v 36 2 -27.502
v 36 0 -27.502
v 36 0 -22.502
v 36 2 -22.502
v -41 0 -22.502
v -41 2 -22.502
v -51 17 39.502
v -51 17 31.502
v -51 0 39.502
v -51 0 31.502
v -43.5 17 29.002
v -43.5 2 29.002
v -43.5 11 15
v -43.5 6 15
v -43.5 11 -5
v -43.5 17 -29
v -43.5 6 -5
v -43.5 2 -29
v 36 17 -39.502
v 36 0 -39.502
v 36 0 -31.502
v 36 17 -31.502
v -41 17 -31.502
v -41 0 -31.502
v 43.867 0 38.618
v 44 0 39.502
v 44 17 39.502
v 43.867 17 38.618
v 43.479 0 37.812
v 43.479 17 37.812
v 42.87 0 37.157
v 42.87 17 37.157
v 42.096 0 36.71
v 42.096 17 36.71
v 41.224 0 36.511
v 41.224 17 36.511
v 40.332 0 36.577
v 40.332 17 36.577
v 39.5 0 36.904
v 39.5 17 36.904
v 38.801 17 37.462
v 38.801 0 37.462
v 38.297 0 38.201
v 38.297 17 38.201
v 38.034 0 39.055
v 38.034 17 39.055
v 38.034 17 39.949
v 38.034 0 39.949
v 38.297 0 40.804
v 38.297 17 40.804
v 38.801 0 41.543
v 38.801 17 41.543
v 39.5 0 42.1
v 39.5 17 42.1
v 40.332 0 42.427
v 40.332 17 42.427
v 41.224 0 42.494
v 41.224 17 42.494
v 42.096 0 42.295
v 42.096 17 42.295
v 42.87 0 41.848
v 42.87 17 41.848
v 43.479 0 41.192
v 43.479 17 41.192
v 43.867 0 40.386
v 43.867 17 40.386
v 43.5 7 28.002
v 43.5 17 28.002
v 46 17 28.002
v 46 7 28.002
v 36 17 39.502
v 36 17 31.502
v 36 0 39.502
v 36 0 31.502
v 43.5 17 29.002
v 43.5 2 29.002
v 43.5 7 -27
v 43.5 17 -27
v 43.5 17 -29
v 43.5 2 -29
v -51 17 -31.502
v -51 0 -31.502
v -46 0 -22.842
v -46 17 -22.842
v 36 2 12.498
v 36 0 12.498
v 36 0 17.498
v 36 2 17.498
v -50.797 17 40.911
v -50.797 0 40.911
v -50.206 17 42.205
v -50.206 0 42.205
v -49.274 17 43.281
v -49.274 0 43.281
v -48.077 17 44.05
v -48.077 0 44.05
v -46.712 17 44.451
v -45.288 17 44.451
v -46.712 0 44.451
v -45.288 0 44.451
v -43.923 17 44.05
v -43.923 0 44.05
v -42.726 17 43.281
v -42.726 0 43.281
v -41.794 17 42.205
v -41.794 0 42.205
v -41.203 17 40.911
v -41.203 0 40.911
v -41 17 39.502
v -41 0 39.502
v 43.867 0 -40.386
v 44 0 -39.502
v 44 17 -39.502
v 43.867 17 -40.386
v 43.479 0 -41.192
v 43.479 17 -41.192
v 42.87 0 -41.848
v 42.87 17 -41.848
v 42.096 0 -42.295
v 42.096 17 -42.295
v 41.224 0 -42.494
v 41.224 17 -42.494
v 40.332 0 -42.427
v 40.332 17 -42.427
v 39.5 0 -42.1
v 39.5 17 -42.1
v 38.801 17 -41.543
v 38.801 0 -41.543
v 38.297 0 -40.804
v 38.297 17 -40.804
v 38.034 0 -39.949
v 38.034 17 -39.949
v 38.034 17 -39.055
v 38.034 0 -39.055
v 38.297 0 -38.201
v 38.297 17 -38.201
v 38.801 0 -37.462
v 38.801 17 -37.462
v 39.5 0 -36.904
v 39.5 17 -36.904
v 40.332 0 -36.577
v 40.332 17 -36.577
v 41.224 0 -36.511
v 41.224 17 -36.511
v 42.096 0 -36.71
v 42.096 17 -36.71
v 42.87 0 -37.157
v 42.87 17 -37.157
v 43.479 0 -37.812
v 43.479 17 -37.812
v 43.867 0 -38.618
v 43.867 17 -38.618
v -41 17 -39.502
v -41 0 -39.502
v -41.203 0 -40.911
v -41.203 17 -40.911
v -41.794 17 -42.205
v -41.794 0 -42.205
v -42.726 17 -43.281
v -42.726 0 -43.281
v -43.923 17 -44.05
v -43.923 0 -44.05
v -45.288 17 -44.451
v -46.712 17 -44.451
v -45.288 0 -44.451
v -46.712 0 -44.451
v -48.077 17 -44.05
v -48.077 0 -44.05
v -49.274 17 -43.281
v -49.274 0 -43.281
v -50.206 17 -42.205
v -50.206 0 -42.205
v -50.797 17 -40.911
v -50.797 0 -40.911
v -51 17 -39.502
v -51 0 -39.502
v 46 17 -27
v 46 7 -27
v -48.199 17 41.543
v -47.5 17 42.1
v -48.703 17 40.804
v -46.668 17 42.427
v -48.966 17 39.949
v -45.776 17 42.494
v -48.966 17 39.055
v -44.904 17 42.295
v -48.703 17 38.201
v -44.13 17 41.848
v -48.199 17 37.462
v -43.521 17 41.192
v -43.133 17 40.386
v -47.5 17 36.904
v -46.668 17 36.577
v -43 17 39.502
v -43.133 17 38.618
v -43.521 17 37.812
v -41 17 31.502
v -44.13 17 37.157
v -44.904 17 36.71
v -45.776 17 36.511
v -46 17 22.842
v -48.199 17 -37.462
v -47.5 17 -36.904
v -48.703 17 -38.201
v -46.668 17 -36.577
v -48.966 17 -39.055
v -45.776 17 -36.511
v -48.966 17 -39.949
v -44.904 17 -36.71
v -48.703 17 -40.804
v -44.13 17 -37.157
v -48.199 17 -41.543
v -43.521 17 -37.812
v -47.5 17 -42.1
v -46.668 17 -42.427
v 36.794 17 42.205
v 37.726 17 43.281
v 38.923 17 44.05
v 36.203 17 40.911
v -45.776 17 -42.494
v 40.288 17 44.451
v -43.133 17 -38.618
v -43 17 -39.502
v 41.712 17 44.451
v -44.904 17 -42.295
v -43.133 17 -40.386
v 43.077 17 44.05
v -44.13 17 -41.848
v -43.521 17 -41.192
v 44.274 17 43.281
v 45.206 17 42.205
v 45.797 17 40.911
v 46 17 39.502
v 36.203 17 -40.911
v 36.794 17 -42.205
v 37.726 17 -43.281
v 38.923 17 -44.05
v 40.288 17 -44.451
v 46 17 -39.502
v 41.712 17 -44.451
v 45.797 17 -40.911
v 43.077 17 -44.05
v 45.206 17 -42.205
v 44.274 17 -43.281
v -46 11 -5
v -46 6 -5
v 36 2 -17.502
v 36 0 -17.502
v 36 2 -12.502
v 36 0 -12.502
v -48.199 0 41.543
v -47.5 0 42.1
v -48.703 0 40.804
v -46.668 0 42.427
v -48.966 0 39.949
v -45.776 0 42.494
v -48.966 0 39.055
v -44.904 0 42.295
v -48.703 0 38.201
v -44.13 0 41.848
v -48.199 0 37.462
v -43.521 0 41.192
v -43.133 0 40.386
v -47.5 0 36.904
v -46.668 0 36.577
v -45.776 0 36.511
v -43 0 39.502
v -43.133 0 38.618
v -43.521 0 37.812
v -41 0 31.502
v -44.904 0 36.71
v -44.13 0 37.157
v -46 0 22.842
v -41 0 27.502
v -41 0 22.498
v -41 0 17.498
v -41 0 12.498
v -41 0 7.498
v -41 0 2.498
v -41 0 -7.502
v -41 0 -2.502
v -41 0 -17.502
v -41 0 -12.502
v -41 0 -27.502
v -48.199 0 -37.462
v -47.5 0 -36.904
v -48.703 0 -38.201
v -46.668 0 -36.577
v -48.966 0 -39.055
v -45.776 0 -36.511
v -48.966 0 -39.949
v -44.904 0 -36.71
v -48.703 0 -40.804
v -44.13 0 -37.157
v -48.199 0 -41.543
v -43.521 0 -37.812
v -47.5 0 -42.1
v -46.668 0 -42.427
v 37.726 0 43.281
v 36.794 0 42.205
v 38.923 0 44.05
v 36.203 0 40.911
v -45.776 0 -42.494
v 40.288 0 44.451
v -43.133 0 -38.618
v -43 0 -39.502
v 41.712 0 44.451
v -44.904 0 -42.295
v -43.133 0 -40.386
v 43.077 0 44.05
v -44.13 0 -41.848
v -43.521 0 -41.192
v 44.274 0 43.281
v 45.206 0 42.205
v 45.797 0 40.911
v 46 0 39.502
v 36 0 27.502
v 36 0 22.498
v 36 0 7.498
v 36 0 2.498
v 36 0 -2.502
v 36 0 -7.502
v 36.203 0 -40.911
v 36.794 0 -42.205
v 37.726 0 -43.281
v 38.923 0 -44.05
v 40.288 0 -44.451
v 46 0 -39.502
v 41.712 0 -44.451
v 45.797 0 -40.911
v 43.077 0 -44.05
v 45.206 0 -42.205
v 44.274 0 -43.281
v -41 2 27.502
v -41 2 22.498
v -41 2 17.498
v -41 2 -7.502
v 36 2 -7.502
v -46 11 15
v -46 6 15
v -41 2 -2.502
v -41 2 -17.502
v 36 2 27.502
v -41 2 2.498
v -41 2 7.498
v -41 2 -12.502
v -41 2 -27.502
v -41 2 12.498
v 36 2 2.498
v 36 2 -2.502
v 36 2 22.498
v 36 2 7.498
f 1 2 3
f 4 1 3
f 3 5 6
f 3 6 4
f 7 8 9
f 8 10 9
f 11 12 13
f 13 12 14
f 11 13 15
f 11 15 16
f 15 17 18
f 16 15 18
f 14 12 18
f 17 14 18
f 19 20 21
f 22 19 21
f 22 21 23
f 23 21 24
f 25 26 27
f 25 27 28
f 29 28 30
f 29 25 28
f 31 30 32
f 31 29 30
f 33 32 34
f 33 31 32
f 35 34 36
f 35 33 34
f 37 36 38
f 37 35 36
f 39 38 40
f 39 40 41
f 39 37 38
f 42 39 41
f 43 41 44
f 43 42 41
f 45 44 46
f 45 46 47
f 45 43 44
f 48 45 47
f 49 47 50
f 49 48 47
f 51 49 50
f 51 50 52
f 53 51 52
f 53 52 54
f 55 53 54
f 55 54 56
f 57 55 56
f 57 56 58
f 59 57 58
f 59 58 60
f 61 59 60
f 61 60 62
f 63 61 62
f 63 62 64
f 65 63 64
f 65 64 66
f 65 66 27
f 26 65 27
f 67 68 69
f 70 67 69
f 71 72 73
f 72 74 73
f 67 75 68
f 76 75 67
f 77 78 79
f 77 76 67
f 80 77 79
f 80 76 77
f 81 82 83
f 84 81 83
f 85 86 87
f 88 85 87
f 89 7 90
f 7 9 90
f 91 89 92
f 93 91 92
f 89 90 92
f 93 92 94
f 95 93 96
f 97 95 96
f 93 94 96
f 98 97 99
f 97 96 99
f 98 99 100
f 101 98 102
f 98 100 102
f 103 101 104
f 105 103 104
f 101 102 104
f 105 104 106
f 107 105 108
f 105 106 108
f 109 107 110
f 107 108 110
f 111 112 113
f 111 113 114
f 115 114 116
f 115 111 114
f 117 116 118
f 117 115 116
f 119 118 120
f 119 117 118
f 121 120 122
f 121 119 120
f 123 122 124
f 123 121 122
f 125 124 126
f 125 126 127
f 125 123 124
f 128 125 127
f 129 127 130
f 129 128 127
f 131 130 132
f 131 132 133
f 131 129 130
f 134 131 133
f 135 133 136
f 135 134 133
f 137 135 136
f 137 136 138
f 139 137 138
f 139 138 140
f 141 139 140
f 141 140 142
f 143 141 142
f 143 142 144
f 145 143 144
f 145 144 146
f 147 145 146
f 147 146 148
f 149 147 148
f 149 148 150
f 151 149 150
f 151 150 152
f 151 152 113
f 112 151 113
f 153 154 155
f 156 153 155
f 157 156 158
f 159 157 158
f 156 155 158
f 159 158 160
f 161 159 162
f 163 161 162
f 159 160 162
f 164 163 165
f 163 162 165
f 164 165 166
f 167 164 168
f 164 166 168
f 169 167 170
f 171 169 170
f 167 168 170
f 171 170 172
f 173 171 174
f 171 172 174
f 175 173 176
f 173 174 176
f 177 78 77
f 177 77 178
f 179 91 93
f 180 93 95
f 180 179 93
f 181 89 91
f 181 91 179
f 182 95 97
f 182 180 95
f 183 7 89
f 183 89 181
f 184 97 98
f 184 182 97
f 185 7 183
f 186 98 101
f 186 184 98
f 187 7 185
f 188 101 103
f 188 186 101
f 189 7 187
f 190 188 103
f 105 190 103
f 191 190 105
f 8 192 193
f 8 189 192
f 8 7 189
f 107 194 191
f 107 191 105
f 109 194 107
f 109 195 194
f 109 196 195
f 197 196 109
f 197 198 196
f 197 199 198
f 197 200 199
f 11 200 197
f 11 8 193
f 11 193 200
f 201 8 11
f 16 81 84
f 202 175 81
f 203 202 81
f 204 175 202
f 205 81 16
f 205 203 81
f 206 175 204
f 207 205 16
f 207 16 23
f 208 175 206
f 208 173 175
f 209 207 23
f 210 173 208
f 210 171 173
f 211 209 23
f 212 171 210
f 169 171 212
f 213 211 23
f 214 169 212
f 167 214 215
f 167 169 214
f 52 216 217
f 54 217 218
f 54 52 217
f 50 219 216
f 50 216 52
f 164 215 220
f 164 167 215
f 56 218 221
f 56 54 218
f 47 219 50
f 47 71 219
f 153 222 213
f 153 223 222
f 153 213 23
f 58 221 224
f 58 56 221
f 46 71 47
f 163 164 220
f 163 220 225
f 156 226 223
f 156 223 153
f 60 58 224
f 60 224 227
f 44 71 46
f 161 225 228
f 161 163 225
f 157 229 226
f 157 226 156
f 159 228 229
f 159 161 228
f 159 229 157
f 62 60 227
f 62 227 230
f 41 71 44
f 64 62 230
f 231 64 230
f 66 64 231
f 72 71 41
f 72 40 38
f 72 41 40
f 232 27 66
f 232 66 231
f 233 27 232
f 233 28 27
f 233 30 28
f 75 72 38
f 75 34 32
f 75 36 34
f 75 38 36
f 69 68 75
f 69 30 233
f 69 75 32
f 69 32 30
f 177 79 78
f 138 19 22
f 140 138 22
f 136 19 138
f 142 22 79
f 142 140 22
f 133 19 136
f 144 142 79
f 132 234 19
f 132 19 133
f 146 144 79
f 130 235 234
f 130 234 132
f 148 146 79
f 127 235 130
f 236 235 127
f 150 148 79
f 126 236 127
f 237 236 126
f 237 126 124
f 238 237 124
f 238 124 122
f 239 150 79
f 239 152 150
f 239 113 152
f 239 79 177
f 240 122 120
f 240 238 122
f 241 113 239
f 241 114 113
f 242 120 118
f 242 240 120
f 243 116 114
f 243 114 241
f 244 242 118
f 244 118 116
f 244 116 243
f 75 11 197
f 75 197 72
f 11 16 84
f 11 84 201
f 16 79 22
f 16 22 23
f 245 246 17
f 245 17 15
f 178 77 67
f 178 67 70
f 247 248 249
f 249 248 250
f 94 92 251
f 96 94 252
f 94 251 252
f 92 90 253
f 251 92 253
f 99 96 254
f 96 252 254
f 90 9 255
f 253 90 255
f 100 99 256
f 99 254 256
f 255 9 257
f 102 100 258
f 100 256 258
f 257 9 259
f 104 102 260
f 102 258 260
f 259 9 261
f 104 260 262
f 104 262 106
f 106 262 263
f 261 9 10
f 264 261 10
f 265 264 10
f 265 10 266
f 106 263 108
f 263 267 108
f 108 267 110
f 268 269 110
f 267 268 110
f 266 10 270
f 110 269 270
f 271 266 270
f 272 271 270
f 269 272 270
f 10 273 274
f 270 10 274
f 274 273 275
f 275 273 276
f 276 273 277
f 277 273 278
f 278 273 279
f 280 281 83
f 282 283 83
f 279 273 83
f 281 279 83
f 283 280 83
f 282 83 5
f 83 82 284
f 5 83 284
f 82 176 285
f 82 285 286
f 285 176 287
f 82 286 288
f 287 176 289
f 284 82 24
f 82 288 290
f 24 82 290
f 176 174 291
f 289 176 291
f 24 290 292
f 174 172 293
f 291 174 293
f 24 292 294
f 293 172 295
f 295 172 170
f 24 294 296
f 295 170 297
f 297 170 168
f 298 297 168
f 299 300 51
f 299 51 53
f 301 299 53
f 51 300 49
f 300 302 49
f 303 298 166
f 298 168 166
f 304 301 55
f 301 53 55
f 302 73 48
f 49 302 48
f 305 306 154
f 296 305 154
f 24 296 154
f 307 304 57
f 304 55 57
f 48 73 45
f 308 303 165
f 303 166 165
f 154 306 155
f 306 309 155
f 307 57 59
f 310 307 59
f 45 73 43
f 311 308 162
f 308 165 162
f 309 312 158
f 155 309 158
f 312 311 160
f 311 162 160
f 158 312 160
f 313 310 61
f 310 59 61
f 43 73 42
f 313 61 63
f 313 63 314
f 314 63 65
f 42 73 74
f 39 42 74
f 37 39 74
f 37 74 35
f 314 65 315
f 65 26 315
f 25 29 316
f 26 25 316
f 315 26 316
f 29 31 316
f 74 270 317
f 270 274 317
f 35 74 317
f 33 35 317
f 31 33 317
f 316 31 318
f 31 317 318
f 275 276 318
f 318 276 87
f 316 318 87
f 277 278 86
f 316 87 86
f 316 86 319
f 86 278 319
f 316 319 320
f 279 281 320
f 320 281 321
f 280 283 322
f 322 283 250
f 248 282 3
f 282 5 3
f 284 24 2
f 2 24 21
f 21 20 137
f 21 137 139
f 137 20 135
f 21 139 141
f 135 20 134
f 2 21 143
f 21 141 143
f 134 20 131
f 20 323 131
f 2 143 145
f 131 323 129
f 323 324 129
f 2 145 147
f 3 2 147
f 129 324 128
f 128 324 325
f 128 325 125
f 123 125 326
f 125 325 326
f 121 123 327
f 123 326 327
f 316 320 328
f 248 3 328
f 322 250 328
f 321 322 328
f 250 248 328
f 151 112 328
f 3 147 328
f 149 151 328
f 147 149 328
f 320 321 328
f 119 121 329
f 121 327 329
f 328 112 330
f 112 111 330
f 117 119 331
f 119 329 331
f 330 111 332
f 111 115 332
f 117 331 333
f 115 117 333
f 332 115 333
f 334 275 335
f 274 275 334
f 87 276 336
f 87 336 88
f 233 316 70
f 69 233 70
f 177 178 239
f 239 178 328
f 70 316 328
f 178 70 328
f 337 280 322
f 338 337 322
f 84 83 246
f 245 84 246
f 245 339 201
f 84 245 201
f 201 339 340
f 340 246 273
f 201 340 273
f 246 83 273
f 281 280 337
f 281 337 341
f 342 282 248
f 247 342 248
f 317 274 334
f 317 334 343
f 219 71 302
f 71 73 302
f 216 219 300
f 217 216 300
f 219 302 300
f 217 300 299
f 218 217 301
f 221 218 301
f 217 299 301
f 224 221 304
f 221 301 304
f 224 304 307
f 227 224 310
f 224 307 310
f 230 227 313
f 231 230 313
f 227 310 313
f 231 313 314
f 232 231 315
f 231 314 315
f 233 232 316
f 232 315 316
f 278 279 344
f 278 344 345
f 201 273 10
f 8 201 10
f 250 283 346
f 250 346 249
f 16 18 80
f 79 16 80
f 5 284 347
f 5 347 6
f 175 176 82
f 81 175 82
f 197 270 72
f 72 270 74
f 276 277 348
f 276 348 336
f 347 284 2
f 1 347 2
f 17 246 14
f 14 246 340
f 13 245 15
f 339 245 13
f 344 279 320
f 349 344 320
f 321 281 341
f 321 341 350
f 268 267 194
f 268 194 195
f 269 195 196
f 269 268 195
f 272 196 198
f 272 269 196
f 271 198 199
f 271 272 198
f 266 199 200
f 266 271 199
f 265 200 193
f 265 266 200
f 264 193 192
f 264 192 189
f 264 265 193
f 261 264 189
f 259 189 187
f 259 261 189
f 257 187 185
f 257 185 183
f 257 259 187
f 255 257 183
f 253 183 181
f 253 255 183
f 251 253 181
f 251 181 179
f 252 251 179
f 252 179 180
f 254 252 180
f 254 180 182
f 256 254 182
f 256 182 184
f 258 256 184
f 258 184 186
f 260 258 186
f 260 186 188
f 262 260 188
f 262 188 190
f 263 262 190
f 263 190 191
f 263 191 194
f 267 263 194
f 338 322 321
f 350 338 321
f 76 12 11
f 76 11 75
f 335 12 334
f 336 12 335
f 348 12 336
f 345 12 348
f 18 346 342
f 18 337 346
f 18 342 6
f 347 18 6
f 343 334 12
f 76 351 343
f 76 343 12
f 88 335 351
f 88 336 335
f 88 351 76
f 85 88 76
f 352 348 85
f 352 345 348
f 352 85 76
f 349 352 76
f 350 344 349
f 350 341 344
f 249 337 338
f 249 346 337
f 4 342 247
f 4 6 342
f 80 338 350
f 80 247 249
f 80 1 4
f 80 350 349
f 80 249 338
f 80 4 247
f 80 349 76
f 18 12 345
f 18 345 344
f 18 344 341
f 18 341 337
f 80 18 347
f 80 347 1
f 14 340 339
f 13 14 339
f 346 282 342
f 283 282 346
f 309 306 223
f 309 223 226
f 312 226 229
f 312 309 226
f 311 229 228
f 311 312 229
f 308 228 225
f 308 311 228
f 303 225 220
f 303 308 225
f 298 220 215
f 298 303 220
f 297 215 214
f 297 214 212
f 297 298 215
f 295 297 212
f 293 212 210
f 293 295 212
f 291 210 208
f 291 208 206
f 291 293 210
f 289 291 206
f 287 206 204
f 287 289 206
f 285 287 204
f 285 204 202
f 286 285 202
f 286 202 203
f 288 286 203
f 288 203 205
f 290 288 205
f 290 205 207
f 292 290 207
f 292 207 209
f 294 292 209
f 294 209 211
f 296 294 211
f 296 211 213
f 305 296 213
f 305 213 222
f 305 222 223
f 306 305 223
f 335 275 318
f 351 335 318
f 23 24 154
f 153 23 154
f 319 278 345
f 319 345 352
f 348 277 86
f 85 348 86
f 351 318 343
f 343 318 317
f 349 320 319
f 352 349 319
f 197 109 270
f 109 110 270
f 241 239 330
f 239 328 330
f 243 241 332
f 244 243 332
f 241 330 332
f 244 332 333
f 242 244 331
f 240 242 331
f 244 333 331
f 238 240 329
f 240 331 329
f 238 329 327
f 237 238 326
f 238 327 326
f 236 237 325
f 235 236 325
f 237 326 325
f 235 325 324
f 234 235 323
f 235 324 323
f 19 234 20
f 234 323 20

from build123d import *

# Parameters (mm, degrees)
BOSS_EXTRUDE1_DEPTH = 2
SKETCH6_W           = 87
SKETCH6_H           = 58.002207555
BOSS_EXTRUDE3_DEPTH = 15
SKETCH10_W          = 2.5
SKETCH10_H          = 55.002207555
CUT_EXTRUDE2_DEPTH  = 10
HOLE5_START         = -1
HOLE5_OUTLINE_R     = 3
HOLE5_DEPTH         = 18
SKETCH15_W          = 20
SKETCH15_H          = 5
CUT_EXTRUDE4_DEPTH  = 2.5
SKETCH_2_W          = 77
SKETCH_2_H          = 5
SKETCH_2_H_2        = 5.00441511
CUT_EXTRUDE_4_DEPTH = 10


with BuildPart() as part:
    # Sketch1 → Boss-Extrude1 (new body)
    with BuildSketch(Plane(origin=(0, 0, 0), x_dir=(1, 0, 0), z_dir=(0, 1, 0))):
        with BuildLine():
            Line((-46, 22.841953517), (-46, -22.841953517))
            Line((-46, -22.841953517), (-51, -31.502207555))
            Line((-51, -31.502207555), (-51, -39.502207555))
            ThreePointArc((-51, -39.502207555), (-46, -44.502207555), (-41, -39.502207555))
            Line((-41, -39.502207555), (-41, -31.502207555))
            Line((-41, -31.502207555), (36, -31.502207555))
            Line((36, -31.502207555), (36, -39.502207555))
            ThreePointArc((36, -39.502207555), (41, -44.502207555), (46, -39.502207555))
            Line((46, -39.502207555), (46, 39.502207555))
            ThreePointArc((46, 39.502207555), (41, 44.502207555), (36, 39.502207555))
            Line((36, 39.502207555), (36, 31.502207555))
            Line((36, 31.502207555), (-41, 31.502207555))
            Line((-41, 31.502207555), (-41, 39.502207555))
            ThreePointArc((-41, 39.502207555), (-46, 44.502207555), (-51, 39.502207555))
            Line((-51, 39.502207555), (-51, 31.502207555))
            Line((-51, 31.502207555), (-46, 22.841953517))
        make_face()
    extrude(amount=BOSS_EXTRUDE1_DEPTH)

    # Sketch6 → Boss-Extrude3 (add)
    with BuildSketch(Plane(origin=(0, 2, 0), x_dir=(1, 0, 0), z_dir=(0, 1, 0))):
        with BuildLine():
            Line((-46, -22.841953517), (-51, -31.502207555))
            Line((-51, -31.502207555), (-51, -39.502207555))
            ThreePointArc((-51, -39.502207555), (-46, -44.502207555), (-41, -39.502207555))
            Line((-41, -39.502207555), (-41, -31.502207555))
            Line((-41, -31.502207555), (36, -31.502207555))
            Line((36, -31.502207555), (36, -39.502207555))
            ThreePointArc((36, -39.502207555), (41, -44.502207555), (46, -39.502207555))
            Line((46, -39.502207555), (46, 39.502207555))
            ThreePointArc((46, 39.502207555), (41, 44.502207555), (36, 39.502207555))
            Line((36, 39.502207555), (36, 31.502207555))
            Line((36, 31.502207555), (-41, 31.502207555))
            Line((-41, 31.502207555), (-41, 39.502207555))
            ThreePointArc((-41, 39.502207555), (-46, 44.502207555), (-51, 39.502207555))
            Line((-51, 39.502207555), (-51, 31.502207555))
            Line((-51, 31.502207555), (-46, 22.841953517))
            Line((-46, 22.841953517), (-46, -22.841953517))
        make_face()
        with Locations((0, -0.001103777)):
            Rectangle(SKETCH6_W, SKETCH6_H, mode=Mode.SUBTRACT)
    extrude(amount=BOSS_EXTRUDE3_DEPTH)

    # Sketch10 → Cut-Extrude2 (cut)
    with BuildSketch(Plane(origin=(0, 17, 0), x_dir=(1, 0, 0), z_dir=(0, 1, 0))):
        with Locations((44.75, -0.501103778)):
            Rectangle(SKETCH10_W, SKETCH10_H)
    extrude(amount=-CUT_EXTRUDE2_DEPTH, mode=Mode.SUBTRACT)

    # Hole5: read off the stored shape, not the designer's step
    # Hole5 outline → Hole5 (cut)
    with BuildSketch(Plane(origin=(0, 0, 0), x_dir=(1, 0, 0), z_dir=(0, 1, 0)).offset(HOLE5_START)):
        with Locations((-46, -39.502207555)):
            Circle(HOLE5_OUTLINE_R)
        with Locations((41, -39.502207555)):
            Circle(HOLE5_OUTLINE_R)
        with Locations((41, 39.502207555)):
            Circle(HOLE5_OUTLINE_R)
        with Locations((-46, 39.502207555)):
            Circle(HOLE5_OUTLINE_R)
    extrude(amount=HOLE5_DEPTH, mode=Mode.SUBTRACT)

    # Sketch15 → Cut-Extrude4 (cut)
    with BuildSketch(Plane.ZY.offset(46)):
        with Locations((5, 8.5)):
            Rectangle(SKETCH15_W, SKETCH15_H)
    extrude(amount=-CUT_EXTRUDE4_DEPTH, mode=Mode.SUBTRACT)

    # 草图2 → 切除-拉伸4 (cut)
    with BuildSketch(Plane.XZ):
        with Locations((-2.5, -25.002207555)):
            Rectangle(SKETCH_2_W, SKETCH_2_H)
        with Locations((-2.5, -15.002207555)):
            Rectangle(SKETCH_2_W, SKETCH_2_H)
        with Locations((-2.5, -5.002207555)):
            Rectangle(SKETCH_2_W, SKETCH_2_H)
        with Locations((-2.5, 4.997792445)):
            Rectangle(SKETCH_2_W, SKETCH_2_H)
        with Locations((-2.5, 14.997792445)):
            Rectangle(SKETCH_2_W, SKETCH_2_H)
        with Locations((-2.5, 25)):
            Rectangle(SKETCH_2_W, SKETCH_2_H_2)
    extrude(amount=-CUT_EXTRUDE_4_DEPTH, mode=Mode.SUBTRACT)


solid = part.part
